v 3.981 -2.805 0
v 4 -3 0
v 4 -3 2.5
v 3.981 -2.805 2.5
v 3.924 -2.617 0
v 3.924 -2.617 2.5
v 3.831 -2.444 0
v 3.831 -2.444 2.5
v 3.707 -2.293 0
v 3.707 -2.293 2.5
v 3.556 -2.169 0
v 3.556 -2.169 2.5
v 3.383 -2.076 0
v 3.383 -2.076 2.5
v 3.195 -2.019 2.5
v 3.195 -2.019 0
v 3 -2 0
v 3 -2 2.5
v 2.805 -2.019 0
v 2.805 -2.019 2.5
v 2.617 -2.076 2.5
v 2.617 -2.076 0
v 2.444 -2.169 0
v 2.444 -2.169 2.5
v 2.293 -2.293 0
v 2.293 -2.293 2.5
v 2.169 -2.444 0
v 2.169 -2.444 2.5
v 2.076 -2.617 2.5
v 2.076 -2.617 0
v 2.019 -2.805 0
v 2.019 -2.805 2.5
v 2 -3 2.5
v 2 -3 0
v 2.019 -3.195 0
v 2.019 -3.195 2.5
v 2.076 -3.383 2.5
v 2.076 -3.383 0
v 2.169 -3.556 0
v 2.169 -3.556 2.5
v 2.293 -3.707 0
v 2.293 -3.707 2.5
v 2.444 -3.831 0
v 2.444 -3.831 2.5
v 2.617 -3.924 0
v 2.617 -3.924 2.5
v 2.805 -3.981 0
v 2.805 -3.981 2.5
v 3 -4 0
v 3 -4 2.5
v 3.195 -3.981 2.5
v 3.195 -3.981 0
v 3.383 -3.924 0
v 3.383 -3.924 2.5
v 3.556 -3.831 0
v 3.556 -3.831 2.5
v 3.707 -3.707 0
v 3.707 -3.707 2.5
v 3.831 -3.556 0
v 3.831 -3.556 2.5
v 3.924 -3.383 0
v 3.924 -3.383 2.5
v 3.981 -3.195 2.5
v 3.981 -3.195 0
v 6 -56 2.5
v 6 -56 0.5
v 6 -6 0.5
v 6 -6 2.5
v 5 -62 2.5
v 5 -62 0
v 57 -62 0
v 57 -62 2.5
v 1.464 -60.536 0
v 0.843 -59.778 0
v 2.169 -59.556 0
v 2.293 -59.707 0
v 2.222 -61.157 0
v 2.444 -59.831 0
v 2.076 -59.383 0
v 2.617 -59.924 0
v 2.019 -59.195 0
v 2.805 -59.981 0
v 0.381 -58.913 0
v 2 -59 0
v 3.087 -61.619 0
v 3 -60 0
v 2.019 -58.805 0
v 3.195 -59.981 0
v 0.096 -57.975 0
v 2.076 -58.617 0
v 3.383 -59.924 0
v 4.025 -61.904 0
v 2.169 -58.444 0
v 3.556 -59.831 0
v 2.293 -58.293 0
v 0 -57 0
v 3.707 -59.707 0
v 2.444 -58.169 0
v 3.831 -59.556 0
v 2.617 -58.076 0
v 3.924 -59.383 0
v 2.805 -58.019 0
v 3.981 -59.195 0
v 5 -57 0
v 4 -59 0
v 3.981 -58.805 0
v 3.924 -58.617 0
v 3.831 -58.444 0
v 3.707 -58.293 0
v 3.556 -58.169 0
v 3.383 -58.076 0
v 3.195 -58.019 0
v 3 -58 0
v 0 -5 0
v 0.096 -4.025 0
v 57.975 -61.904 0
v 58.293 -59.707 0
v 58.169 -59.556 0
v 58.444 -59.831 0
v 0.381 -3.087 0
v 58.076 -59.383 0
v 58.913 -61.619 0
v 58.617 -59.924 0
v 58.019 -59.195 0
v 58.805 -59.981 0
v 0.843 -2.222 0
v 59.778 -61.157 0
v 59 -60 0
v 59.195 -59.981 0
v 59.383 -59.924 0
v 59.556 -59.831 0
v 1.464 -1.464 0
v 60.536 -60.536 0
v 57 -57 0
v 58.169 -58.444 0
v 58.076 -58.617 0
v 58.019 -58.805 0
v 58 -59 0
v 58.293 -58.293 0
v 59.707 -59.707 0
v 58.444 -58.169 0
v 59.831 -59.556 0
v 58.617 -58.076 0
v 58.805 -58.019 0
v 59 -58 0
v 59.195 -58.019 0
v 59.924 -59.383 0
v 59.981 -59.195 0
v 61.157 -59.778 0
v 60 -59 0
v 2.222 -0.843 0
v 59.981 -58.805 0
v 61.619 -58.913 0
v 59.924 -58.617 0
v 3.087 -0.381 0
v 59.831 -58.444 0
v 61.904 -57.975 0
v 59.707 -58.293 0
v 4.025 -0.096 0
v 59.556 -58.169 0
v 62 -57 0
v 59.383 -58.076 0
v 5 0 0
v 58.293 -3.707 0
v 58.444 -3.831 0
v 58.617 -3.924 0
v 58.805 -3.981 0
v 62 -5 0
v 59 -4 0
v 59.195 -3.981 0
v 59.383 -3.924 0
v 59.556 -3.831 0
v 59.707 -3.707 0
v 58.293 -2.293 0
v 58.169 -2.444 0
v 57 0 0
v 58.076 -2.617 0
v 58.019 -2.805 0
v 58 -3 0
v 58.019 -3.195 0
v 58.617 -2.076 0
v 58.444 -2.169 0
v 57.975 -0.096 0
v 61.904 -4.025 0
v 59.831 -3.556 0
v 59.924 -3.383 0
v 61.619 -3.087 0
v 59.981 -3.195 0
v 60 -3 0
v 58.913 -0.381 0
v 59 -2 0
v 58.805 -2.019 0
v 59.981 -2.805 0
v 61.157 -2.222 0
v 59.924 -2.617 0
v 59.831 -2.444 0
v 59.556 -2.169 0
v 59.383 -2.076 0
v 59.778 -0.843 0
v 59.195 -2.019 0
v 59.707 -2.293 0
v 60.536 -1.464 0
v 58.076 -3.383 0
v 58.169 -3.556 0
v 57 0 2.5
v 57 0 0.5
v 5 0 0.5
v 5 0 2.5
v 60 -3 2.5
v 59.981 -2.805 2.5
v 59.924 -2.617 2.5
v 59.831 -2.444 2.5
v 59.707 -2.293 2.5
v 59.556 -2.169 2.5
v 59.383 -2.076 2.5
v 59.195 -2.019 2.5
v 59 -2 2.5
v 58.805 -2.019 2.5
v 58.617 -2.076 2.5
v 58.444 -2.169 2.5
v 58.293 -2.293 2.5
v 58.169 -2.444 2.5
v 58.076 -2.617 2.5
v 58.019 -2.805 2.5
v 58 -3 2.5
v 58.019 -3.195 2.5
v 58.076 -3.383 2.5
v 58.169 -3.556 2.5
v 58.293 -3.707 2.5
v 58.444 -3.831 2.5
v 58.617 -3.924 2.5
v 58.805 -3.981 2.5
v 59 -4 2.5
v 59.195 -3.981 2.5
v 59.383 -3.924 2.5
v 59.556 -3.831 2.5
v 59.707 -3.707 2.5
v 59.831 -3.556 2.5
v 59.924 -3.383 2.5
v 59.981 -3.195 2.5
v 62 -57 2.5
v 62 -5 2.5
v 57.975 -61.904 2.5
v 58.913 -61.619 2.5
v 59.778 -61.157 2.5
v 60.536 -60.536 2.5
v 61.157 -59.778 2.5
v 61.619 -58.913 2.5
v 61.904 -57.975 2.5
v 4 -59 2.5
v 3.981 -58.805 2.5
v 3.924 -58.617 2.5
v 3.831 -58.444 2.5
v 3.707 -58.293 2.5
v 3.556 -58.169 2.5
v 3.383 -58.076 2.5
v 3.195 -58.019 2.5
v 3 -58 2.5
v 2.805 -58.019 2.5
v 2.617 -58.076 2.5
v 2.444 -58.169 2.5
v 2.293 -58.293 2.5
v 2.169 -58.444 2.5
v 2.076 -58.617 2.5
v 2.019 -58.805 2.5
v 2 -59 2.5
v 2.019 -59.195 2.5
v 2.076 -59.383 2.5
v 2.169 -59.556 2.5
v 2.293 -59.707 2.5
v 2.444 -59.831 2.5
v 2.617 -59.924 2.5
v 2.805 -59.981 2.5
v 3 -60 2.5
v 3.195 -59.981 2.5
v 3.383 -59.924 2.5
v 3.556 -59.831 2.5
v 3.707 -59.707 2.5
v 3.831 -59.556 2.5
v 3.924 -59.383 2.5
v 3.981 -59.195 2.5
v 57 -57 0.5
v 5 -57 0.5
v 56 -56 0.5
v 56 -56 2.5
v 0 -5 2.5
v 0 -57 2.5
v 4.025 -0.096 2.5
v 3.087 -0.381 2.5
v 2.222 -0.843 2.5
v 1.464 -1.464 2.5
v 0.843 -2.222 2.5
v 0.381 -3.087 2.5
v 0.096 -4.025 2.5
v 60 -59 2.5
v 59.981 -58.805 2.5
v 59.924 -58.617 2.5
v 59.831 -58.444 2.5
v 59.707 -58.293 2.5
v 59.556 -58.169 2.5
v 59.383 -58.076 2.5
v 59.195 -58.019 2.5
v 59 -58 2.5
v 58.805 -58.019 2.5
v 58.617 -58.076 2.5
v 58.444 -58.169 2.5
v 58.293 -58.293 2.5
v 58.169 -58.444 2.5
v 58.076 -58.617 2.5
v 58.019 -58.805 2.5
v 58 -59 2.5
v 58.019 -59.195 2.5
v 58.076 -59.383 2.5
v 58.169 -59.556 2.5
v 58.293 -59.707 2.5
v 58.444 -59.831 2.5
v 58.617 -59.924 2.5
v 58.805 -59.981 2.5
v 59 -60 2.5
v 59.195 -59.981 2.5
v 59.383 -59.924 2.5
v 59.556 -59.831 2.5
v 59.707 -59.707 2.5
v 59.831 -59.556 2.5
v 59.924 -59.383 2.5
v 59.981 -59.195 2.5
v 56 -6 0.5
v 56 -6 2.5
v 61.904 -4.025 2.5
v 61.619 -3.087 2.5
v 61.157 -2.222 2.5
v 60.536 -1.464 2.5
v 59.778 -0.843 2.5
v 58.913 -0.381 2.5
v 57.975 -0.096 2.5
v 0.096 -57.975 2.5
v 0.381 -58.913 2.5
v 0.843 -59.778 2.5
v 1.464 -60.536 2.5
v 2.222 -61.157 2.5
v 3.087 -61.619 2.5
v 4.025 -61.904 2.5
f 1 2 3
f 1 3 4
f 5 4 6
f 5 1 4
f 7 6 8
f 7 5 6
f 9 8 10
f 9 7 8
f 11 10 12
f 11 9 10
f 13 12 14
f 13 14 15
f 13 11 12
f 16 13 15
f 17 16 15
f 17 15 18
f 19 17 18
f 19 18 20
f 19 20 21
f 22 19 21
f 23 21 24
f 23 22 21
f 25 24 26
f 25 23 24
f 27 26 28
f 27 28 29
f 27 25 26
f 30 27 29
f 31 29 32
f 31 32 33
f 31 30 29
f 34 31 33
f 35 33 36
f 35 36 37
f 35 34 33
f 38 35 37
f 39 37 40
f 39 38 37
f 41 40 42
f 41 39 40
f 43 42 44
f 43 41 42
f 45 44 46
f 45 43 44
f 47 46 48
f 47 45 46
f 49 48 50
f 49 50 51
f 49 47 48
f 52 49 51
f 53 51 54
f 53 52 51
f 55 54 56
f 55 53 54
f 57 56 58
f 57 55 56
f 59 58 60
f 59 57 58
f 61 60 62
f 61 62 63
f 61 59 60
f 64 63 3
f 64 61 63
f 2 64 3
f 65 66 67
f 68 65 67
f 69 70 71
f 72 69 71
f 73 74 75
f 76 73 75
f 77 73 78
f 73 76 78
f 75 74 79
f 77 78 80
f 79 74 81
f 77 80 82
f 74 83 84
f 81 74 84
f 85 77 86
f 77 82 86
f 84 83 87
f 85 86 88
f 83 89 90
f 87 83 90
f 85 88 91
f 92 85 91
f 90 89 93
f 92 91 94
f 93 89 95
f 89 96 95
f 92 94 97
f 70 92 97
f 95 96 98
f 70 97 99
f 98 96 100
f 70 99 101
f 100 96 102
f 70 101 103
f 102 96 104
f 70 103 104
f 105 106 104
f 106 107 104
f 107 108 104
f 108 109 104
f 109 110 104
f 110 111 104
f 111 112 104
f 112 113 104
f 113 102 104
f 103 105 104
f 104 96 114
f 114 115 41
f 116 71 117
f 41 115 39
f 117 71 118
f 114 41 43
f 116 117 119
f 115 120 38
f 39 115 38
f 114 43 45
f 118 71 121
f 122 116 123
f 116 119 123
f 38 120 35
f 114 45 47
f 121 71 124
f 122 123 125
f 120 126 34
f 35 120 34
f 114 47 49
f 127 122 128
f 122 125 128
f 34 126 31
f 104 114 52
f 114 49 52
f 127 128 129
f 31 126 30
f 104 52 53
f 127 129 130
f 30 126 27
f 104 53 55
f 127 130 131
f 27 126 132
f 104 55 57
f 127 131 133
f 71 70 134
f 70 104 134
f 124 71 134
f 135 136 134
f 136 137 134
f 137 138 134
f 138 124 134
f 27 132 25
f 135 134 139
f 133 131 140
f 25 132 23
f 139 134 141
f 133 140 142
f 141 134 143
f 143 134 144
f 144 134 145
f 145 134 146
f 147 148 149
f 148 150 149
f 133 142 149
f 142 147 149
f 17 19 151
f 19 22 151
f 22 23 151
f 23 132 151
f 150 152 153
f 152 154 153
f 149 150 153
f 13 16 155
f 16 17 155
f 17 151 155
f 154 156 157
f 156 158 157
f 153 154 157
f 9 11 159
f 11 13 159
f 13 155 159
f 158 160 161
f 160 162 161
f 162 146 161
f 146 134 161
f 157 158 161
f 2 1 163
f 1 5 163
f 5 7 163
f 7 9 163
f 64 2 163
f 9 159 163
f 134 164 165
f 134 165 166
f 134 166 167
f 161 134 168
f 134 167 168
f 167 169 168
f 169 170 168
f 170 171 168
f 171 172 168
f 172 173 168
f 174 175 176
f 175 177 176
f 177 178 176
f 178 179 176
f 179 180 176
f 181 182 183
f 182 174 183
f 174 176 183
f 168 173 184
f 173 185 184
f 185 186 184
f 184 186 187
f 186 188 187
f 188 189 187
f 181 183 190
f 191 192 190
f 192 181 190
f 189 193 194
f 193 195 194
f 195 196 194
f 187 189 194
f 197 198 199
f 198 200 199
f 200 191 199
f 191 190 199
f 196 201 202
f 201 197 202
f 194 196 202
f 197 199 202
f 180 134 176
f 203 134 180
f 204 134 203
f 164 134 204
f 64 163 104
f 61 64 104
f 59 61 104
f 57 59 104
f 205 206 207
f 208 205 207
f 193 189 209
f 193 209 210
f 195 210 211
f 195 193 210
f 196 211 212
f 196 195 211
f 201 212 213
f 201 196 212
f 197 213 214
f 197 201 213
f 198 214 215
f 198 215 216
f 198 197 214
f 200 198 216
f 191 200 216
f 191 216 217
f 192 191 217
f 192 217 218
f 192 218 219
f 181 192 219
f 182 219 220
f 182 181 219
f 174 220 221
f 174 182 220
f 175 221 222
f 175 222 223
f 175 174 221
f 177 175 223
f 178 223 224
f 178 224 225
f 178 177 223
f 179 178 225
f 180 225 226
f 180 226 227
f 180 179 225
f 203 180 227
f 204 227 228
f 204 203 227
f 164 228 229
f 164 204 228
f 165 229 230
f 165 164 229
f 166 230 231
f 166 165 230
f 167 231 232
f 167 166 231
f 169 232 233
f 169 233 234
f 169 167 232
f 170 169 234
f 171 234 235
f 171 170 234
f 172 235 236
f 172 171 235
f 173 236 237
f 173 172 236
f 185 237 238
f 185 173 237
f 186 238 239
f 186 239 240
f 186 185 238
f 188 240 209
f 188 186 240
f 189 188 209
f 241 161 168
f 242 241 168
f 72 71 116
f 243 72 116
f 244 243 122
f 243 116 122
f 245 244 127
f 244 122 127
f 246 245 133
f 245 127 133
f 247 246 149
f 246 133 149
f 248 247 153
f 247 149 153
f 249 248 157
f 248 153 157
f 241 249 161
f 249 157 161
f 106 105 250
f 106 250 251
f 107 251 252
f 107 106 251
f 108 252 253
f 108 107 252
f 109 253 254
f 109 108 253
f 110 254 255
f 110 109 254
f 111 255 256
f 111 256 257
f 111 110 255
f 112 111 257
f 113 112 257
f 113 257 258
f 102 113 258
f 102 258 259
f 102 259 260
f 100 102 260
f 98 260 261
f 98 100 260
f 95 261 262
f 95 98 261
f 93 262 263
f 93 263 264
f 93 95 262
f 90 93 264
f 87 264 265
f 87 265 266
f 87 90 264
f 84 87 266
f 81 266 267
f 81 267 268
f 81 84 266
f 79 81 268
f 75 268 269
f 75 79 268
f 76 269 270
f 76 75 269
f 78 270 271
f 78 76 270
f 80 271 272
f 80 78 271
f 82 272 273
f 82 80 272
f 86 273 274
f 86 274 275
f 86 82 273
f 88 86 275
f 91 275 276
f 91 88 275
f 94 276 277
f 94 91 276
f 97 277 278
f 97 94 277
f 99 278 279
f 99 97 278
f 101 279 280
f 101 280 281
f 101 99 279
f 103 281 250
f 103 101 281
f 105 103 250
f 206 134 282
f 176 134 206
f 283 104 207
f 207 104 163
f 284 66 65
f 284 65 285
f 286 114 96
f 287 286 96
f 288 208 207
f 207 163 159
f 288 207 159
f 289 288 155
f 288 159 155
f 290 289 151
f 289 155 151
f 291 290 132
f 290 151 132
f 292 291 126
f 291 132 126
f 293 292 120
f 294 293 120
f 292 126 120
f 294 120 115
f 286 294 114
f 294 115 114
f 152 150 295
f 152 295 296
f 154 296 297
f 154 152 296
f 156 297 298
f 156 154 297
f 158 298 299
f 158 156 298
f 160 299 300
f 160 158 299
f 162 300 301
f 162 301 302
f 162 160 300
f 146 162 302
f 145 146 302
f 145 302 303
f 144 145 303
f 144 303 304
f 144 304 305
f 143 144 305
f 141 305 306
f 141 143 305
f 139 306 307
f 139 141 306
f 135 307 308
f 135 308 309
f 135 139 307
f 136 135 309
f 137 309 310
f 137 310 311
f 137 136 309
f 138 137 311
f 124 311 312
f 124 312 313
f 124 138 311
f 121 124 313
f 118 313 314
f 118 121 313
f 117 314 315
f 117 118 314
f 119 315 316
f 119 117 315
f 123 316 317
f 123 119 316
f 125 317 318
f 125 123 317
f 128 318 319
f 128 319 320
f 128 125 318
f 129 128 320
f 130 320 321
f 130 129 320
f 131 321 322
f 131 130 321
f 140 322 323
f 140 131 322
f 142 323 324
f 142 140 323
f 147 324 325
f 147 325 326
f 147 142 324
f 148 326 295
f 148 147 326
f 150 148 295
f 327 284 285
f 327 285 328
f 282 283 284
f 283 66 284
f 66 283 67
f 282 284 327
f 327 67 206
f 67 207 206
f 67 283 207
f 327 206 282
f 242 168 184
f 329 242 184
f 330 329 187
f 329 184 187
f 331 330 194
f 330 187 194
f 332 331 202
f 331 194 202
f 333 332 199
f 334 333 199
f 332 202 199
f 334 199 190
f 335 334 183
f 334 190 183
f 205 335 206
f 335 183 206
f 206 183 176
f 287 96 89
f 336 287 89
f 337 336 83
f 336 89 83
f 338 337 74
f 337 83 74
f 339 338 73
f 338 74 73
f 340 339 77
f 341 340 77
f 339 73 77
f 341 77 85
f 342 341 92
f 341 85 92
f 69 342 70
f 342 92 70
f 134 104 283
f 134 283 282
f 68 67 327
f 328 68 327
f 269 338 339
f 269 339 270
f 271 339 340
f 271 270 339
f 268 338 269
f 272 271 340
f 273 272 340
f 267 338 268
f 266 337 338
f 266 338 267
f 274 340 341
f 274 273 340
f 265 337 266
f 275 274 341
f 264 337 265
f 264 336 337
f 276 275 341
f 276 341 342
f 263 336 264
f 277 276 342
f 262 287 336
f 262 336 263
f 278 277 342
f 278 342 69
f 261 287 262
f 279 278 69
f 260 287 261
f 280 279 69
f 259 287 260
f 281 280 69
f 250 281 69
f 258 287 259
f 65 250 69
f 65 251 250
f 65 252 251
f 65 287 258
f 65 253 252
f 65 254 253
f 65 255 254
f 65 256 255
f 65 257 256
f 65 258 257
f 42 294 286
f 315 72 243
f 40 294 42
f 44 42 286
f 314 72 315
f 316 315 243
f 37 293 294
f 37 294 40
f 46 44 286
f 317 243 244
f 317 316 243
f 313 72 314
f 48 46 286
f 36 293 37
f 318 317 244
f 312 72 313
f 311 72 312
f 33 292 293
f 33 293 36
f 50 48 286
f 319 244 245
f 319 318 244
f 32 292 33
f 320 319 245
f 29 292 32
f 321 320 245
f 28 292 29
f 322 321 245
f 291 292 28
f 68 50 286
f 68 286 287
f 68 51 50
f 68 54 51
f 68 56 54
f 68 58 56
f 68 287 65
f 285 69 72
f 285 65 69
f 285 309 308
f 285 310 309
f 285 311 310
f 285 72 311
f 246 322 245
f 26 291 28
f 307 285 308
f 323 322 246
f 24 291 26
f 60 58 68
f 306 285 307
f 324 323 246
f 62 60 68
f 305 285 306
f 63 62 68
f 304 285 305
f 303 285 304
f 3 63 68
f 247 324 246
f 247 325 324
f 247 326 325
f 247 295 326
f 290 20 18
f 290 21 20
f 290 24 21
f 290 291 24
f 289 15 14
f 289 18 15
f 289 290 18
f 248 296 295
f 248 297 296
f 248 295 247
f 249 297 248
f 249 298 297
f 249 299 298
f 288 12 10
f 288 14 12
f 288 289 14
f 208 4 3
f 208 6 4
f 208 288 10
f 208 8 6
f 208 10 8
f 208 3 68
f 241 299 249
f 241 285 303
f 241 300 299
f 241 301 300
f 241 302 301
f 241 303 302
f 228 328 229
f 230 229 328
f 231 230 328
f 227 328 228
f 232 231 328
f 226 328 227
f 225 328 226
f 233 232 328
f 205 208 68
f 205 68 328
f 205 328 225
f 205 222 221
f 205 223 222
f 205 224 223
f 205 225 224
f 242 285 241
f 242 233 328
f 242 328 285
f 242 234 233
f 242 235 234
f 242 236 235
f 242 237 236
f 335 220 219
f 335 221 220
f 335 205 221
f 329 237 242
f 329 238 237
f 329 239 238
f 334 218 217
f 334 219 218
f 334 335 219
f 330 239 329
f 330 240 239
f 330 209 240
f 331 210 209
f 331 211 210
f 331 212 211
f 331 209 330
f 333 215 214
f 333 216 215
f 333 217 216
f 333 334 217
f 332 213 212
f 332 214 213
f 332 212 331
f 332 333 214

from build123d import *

# Parameters (mm, degrees)
F0_R     = 1
F0_W     = 52
F0_H     = 52
F0_W_2   = 50
F0_H_2   = 50
F1_DEPTH = 2.5
F2_DEPTH = 0.5
F3_W     = 52
F3_H     = 5
F4_DEPTH = 0.5


with BuildPart() as f1:
    # F0 (on Top) → F1 (new body)
    with BuildSketch(Plane.XY):
        with BuildLine():
            Line((57, 0), (5, 0))
            ThreePointArc((5, 0), (1.464466, -1.464466), (0, -5))
            Line((0, -5), (0, -57))
            ThreePointArc((0, -57), (1.464466, -60.535534), (5, -62))
            Line((5, -62), (57, -62))
            ThreePointArc((57, -62), (60.535534, -60.535534), (62, -57))
            Line((62, -57), (62, -5))
            ThreePointArc((62, -5), (60.535534, -1.464466), (57, 0))
        make_face()
        with Locations((3, -59)):
            Circle(F0_R, mode=Mode.SUBTRACT)
        with Locations((59, -59)):
            Circle(F0_R, mode=Mode.SUBTRACT)
        with Locations((3, -3)):
            Circle(F0_R, mode=Mode.SUBTRACT)
        with Locations((31, -31)):
            Rectangle(F0_W, F0_H, mode=Mode.SUBTRACT)
        with Locations((59, -3)):
            Circle(F0_R, mode=Mode.SUBTRACT)
        with Locations((31, -31)):
            Rectangle(F0_W, F0_H)
        with Locations((31, -31)):
            Rectangle(F0_W_2, F0_H_2, mode=Mode.SUBTRACT)
    extrude(amount=F1_DEPTH)

    # F0 (on Top) → F2 (cut)
    with BuildSketch(Plane.XY):
        with Locations((31, -31)):
            Rectangle(F0_W, F0_H)
        with Locations((31, -31)):
            Rectangle(F0_W_2, F0_H_2, mode=Mode.SUBTRACT)
    extrude(amount=F2_DEPTH, mode=Mode.SUBTRACT)

    # F3 (on face) → F4 (cut)
    with BuildSketch(Plane.XY):
        with Locations((31, -2.5)):
            Rectangle(F3_W, F3_H)
    extrude(amount=F4_DEPTH, mode=Mode.SUBTRACT)


solid = f1.part
